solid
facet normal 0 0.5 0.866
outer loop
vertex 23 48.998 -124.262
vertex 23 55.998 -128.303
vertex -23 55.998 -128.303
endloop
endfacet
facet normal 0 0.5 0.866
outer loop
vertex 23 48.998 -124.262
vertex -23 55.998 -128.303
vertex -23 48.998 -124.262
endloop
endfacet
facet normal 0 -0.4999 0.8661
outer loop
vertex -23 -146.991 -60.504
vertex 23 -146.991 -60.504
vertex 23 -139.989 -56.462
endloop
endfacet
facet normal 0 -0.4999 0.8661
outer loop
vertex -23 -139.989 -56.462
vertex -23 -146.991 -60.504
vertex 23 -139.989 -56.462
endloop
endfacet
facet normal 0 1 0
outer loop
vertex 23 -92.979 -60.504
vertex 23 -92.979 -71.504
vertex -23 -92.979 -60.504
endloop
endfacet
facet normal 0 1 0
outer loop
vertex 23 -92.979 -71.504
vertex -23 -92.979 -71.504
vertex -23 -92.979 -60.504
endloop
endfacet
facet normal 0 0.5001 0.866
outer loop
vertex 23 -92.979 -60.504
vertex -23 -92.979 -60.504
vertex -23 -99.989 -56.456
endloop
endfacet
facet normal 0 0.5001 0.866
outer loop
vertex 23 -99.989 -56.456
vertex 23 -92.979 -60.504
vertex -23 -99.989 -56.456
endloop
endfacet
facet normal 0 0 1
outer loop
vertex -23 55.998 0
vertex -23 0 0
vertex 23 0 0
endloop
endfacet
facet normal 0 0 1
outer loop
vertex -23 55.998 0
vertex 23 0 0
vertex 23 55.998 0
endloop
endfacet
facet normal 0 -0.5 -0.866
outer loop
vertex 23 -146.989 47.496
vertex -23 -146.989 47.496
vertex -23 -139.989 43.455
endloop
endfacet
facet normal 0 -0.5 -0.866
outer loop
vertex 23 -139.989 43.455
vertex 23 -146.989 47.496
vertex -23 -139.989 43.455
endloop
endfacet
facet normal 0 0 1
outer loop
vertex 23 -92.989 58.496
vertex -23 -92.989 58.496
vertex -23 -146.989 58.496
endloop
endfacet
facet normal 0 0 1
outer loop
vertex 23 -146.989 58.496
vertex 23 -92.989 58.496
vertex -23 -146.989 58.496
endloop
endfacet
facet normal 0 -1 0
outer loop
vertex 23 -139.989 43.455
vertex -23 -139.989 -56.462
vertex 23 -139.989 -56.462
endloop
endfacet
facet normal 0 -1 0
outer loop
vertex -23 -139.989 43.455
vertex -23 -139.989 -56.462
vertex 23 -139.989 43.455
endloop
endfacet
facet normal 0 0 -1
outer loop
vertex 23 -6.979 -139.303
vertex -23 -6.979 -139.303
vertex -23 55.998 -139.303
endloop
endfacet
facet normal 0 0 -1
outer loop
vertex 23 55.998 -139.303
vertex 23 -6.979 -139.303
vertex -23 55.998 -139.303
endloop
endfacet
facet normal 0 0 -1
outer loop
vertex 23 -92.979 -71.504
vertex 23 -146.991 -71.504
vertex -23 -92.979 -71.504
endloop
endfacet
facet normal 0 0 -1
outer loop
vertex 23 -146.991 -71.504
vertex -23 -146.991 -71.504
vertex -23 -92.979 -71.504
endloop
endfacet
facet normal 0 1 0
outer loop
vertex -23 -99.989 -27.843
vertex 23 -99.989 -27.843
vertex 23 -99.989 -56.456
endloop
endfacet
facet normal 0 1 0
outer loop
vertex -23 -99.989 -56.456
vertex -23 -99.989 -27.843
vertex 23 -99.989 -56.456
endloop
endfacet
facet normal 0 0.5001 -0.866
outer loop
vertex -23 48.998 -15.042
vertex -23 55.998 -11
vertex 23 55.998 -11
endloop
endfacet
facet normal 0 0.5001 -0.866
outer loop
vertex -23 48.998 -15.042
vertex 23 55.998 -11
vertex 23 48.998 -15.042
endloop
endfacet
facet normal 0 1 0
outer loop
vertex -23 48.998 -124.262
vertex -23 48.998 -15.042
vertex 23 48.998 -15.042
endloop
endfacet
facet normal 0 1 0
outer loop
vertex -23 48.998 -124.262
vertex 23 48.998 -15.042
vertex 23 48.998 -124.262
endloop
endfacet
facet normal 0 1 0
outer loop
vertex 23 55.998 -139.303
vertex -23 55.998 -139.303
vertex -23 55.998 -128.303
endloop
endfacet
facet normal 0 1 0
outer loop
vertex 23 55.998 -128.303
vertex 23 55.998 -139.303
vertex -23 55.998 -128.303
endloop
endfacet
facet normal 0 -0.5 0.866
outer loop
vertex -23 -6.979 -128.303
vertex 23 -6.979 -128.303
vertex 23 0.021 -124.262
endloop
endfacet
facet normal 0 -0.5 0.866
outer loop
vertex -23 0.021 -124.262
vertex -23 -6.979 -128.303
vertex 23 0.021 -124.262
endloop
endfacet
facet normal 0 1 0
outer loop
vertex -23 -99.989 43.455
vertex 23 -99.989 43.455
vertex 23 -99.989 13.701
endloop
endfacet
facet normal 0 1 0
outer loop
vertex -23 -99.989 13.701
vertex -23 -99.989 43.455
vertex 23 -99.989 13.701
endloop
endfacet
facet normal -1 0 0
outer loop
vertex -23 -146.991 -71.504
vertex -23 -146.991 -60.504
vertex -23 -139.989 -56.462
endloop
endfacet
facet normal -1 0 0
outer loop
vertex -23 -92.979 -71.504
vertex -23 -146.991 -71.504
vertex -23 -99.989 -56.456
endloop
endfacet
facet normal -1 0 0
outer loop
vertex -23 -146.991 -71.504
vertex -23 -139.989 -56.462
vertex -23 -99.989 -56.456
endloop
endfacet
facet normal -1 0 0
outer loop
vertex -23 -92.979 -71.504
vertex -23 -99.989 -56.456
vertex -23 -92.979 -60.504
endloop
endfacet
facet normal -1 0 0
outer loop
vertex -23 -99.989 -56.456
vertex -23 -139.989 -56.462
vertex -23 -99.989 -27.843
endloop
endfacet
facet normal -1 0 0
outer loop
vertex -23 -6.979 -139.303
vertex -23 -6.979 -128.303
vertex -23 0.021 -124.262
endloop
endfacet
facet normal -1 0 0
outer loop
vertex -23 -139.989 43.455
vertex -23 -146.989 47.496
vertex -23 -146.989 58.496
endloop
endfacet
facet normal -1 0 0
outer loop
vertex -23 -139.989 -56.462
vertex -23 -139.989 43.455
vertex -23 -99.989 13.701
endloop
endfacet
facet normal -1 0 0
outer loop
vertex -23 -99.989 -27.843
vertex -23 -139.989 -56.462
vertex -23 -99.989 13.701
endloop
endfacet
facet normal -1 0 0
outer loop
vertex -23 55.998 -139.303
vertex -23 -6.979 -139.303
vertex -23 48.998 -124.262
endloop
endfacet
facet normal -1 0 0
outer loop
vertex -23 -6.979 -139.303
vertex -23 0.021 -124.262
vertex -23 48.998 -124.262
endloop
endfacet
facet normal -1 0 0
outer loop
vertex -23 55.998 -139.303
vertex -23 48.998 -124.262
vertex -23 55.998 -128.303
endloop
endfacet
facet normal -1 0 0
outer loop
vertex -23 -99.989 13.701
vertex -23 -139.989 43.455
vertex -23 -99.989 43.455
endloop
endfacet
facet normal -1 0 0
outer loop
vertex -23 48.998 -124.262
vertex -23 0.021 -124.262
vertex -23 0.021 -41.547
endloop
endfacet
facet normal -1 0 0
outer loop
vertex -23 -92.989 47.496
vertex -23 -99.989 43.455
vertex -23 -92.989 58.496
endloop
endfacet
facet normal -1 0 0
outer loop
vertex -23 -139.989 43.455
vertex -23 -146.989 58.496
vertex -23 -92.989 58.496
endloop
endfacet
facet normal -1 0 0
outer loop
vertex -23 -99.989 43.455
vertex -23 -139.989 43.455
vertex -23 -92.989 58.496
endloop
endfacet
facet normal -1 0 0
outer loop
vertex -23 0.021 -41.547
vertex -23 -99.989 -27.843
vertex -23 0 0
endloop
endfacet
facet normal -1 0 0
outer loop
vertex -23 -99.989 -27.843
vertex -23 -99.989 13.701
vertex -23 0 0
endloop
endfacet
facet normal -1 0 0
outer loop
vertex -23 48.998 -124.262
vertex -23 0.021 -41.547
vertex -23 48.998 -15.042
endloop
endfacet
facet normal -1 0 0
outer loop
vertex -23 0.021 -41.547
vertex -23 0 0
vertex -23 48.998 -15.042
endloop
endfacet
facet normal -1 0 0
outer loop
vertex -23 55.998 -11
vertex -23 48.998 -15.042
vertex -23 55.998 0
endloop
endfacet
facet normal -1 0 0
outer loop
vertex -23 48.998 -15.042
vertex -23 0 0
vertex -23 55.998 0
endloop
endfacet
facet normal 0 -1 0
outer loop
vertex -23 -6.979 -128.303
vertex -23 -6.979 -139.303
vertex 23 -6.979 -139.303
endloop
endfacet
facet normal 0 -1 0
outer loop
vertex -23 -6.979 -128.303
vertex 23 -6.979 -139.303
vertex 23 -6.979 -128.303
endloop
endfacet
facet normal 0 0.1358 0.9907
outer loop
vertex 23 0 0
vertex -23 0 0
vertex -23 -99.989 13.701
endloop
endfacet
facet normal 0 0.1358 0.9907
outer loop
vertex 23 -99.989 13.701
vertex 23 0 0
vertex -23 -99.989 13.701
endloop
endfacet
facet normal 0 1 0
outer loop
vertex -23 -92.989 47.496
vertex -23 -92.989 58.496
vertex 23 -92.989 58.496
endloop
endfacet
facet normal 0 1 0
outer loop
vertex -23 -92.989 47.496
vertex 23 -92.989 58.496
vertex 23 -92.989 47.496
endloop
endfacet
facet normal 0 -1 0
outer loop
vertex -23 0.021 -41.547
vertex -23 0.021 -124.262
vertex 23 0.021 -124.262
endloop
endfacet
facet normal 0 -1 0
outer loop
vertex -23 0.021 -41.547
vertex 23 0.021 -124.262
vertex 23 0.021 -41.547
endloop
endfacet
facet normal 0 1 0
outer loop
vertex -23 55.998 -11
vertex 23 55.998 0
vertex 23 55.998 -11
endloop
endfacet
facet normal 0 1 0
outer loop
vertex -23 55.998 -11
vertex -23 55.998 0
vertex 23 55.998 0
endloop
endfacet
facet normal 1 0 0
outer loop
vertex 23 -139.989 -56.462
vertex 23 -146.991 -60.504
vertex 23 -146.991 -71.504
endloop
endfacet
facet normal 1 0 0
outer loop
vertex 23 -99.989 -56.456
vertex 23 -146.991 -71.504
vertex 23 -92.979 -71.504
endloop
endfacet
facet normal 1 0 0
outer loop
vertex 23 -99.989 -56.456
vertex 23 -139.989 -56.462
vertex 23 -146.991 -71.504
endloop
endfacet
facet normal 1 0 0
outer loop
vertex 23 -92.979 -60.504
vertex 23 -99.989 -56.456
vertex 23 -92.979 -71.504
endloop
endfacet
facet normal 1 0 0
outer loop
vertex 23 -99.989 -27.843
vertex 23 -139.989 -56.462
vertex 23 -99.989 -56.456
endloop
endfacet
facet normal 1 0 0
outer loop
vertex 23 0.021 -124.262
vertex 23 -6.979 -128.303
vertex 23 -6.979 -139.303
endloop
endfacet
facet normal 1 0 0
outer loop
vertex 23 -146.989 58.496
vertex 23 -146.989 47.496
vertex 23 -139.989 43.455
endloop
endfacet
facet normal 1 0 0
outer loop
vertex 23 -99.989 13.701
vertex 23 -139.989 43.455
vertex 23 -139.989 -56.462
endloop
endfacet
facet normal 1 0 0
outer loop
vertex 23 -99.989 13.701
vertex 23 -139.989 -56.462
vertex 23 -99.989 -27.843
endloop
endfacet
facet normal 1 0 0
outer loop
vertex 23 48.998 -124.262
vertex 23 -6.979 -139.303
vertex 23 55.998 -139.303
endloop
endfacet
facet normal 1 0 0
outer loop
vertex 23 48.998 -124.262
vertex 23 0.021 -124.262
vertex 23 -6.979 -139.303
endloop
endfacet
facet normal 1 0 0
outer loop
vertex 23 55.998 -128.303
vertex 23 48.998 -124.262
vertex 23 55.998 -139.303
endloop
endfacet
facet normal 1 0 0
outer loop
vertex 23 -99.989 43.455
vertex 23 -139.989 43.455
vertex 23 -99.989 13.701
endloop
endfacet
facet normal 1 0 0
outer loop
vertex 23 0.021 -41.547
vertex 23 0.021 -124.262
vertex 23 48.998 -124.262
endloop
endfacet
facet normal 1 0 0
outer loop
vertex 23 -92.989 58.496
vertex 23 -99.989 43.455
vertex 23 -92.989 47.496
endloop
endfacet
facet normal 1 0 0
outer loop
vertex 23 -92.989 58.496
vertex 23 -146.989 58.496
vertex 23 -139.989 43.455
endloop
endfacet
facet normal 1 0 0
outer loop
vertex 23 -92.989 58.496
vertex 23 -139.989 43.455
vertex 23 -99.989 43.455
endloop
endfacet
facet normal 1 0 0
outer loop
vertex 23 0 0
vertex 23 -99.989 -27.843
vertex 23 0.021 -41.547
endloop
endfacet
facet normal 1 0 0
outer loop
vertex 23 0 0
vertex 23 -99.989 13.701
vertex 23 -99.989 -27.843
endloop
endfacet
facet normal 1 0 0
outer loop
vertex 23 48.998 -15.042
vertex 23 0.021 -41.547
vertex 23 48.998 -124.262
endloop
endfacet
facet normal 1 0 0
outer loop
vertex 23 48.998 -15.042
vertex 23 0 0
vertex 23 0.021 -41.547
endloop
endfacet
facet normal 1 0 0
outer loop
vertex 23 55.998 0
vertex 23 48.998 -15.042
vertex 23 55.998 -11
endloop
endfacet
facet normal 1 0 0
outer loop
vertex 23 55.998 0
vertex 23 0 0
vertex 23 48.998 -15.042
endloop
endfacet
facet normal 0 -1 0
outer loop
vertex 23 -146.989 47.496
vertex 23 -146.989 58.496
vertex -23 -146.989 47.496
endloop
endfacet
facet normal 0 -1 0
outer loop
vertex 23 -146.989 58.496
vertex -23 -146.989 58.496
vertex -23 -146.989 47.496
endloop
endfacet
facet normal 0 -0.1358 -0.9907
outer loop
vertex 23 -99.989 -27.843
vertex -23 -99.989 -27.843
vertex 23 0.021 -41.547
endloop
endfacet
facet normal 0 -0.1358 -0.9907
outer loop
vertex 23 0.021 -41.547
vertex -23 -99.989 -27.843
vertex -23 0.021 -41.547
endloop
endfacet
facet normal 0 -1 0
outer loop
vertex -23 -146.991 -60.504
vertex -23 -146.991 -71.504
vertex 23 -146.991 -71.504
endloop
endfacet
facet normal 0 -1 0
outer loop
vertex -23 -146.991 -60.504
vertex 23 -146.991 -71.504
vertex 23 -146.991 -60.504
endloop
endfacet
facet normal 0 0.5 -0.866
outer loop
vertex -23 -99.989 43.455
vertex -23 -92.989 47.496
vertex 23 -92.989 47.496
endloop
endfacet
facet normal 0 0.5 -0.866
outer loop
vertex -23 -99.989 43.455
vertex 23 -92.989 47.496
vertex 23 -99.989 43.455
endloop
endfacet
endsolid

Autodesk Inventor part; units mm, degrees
ref_plane "YZ Plane" through (0, 0, 0) normal (1, 0, 0) x (0, 1, 0)
ref_plane "XZ Plane" through (0, 0, 0) normal (0, 1, 0) x (-1, 0, 0)
ref_plane "XY Plane" through (0, 0, 0) normal (0, 0, 1) x (1, 0, 0)
sketch "Sketch3" plane through (0, 0, 0) normal (1, 0, 0) x (0, 1, 0)
  line L0 (0, 0) -> (48.9982, 0)
  line L1 (48.9982, -15.0415) -> (48.9982, -124.2618)
  line L2 (48.9982, -139.3032) -> (0.0211, -139.3032)
  line L3 (0.0211, -124.2618) -> (0.0211, -41.5471)
  line L4 (0, 0) -> (-99.9892, 13.7012)
  line L5 (-99.9892, -27.843) -> (0.0211, -41.5471)
  line L6 (48.9982, -139.3032) -> (55.9982, -139.3032)
  line L7 (55.9982, -139.3032) -> (55.9982, -128.3032)
  line L8 (55.9982, -128.3032) -> (48.9982, -124.2618)
  line L9 (48.9982, 0) -> (55.9982, 0)
  line L10 (55.9982, 0) -> (55.9982, -11)
  line L11 (55.9982, -11) -> (48.9982, -15.0415)
  line L12 (0.0211, -139.3032) -> (-6.9789, -139.3032)
  line L13 (-6.9789, -139.3032) -> (-6.9789, -128.3032)
  line L14 (-6.9789, -128.3032) -> (0.0211, -124.2618)
  line L15 (-148.6902, -63.3226) -> (-148.65, -63.3226)
  line L16 (-99.9892, -27.843) -> (-99.9892, -56.4562)
  line L17 (-99.9789, -71.5036) -> (-139.9913, -71.5036)
  line L18 (-139.9892, -56.4622) -> (-139.9892, 43.4549)
  line L19 (-139.9892, 58.4964) -> (-99.9892, 58.4964)
  line L20 (-99.9892, 43.4549) -> (-99.9892, 13.7012)
  line L21 (-99.9789, -71.5036) -> (-92.9789, -71.5036)
  line L22 (-92.9789, -71.5036) -> (-92.9789, -60.5036)
  line L23 (-92.9789, -60.5036) -> (-99.9892, -56.4562)
  line L24 (-139.9913, -71.5036) -> (-146.9913, -71.5036)
  line L25 (-146.9913, -71.5036) -> (-146.9913, -60.5036)
  line L26 (-146.9913, -60.5036) -> (-139.9892, -56.4622)
  line L27 (-139.9892, 58.4964) -> (-146.9892, 58.4964)
  line L28 (-146.9892, 58.4964) -> (-146.9892, 47.4964)
  line L29 (-146.9892, 47.4964) -> (-139.9892, 43.4549)
  line L30 (-99.9892, 58.4964) -> (-92.9892, 58.4964)
  line L31 (-92.9892, 58.4964) -> (-92.9892, 47.4964)
  line L32 (-92.9892, 47.4964) -> (-99.9892, 43.4549)
  dimension "d11" = 120
  dimension "d12" = 7
  dimension "d13" = 11
  dimension "d16" = 130
  dimension "d17" = 40
  dimension "d18" = 7
  dimension "d19" = 11
  dimension "d20" = 120
  dimension "d21" = 120
extrude "Extrusion1" add sketch "Sketch3" along normal mid plane 46
sketch "Sketch4" plane through (23, 0.0211, -41.5471) normal (0, -0.1358, -0.9907) x (-1, 0, 0)
  line L0 (0, -5.6613) -> (0, -106.5849) projected
  line L1 (4.6881, -26.5876) -> (4.6881, -87.9351)
  line L2 (4.6881, -87.9351) -> (0, -92.5468)
  line L3 (-2.0913, -87.9351) -> (56.7354, -87.9351) construction
  line L4 (4.6881, -26.5876) -> (0, 0)
  line L5 (46, 0) -> (0, 0) projected
  line L6 (-9.1248, -26.5258) -> (54.948, -26.5258) construction
  line L7 (46, 0) -> (46, -100.9449) projected
  line L8 (46, 0) -> (41.3228, -26.5258)
  line L9 (41.3228, -26.5258) -> (41.3228, -87.9351)
  line L10 (41.3228, -87.9351) -> (46, -92.5468)
  line L11 (46, -106.5849) -> (46, -5.6613) projected
  point P0 (23, -5.6613)
  dimension "d25" = 80
  dimension "d26" = 80
sketch "Sketch5" plane through (23, 0.0211, -41.5471) normal (0, -0.1358, -0.9907) x (-1, 0, 0)
  point P0 (23, -5.6613)
properties part number "Big Housing"
